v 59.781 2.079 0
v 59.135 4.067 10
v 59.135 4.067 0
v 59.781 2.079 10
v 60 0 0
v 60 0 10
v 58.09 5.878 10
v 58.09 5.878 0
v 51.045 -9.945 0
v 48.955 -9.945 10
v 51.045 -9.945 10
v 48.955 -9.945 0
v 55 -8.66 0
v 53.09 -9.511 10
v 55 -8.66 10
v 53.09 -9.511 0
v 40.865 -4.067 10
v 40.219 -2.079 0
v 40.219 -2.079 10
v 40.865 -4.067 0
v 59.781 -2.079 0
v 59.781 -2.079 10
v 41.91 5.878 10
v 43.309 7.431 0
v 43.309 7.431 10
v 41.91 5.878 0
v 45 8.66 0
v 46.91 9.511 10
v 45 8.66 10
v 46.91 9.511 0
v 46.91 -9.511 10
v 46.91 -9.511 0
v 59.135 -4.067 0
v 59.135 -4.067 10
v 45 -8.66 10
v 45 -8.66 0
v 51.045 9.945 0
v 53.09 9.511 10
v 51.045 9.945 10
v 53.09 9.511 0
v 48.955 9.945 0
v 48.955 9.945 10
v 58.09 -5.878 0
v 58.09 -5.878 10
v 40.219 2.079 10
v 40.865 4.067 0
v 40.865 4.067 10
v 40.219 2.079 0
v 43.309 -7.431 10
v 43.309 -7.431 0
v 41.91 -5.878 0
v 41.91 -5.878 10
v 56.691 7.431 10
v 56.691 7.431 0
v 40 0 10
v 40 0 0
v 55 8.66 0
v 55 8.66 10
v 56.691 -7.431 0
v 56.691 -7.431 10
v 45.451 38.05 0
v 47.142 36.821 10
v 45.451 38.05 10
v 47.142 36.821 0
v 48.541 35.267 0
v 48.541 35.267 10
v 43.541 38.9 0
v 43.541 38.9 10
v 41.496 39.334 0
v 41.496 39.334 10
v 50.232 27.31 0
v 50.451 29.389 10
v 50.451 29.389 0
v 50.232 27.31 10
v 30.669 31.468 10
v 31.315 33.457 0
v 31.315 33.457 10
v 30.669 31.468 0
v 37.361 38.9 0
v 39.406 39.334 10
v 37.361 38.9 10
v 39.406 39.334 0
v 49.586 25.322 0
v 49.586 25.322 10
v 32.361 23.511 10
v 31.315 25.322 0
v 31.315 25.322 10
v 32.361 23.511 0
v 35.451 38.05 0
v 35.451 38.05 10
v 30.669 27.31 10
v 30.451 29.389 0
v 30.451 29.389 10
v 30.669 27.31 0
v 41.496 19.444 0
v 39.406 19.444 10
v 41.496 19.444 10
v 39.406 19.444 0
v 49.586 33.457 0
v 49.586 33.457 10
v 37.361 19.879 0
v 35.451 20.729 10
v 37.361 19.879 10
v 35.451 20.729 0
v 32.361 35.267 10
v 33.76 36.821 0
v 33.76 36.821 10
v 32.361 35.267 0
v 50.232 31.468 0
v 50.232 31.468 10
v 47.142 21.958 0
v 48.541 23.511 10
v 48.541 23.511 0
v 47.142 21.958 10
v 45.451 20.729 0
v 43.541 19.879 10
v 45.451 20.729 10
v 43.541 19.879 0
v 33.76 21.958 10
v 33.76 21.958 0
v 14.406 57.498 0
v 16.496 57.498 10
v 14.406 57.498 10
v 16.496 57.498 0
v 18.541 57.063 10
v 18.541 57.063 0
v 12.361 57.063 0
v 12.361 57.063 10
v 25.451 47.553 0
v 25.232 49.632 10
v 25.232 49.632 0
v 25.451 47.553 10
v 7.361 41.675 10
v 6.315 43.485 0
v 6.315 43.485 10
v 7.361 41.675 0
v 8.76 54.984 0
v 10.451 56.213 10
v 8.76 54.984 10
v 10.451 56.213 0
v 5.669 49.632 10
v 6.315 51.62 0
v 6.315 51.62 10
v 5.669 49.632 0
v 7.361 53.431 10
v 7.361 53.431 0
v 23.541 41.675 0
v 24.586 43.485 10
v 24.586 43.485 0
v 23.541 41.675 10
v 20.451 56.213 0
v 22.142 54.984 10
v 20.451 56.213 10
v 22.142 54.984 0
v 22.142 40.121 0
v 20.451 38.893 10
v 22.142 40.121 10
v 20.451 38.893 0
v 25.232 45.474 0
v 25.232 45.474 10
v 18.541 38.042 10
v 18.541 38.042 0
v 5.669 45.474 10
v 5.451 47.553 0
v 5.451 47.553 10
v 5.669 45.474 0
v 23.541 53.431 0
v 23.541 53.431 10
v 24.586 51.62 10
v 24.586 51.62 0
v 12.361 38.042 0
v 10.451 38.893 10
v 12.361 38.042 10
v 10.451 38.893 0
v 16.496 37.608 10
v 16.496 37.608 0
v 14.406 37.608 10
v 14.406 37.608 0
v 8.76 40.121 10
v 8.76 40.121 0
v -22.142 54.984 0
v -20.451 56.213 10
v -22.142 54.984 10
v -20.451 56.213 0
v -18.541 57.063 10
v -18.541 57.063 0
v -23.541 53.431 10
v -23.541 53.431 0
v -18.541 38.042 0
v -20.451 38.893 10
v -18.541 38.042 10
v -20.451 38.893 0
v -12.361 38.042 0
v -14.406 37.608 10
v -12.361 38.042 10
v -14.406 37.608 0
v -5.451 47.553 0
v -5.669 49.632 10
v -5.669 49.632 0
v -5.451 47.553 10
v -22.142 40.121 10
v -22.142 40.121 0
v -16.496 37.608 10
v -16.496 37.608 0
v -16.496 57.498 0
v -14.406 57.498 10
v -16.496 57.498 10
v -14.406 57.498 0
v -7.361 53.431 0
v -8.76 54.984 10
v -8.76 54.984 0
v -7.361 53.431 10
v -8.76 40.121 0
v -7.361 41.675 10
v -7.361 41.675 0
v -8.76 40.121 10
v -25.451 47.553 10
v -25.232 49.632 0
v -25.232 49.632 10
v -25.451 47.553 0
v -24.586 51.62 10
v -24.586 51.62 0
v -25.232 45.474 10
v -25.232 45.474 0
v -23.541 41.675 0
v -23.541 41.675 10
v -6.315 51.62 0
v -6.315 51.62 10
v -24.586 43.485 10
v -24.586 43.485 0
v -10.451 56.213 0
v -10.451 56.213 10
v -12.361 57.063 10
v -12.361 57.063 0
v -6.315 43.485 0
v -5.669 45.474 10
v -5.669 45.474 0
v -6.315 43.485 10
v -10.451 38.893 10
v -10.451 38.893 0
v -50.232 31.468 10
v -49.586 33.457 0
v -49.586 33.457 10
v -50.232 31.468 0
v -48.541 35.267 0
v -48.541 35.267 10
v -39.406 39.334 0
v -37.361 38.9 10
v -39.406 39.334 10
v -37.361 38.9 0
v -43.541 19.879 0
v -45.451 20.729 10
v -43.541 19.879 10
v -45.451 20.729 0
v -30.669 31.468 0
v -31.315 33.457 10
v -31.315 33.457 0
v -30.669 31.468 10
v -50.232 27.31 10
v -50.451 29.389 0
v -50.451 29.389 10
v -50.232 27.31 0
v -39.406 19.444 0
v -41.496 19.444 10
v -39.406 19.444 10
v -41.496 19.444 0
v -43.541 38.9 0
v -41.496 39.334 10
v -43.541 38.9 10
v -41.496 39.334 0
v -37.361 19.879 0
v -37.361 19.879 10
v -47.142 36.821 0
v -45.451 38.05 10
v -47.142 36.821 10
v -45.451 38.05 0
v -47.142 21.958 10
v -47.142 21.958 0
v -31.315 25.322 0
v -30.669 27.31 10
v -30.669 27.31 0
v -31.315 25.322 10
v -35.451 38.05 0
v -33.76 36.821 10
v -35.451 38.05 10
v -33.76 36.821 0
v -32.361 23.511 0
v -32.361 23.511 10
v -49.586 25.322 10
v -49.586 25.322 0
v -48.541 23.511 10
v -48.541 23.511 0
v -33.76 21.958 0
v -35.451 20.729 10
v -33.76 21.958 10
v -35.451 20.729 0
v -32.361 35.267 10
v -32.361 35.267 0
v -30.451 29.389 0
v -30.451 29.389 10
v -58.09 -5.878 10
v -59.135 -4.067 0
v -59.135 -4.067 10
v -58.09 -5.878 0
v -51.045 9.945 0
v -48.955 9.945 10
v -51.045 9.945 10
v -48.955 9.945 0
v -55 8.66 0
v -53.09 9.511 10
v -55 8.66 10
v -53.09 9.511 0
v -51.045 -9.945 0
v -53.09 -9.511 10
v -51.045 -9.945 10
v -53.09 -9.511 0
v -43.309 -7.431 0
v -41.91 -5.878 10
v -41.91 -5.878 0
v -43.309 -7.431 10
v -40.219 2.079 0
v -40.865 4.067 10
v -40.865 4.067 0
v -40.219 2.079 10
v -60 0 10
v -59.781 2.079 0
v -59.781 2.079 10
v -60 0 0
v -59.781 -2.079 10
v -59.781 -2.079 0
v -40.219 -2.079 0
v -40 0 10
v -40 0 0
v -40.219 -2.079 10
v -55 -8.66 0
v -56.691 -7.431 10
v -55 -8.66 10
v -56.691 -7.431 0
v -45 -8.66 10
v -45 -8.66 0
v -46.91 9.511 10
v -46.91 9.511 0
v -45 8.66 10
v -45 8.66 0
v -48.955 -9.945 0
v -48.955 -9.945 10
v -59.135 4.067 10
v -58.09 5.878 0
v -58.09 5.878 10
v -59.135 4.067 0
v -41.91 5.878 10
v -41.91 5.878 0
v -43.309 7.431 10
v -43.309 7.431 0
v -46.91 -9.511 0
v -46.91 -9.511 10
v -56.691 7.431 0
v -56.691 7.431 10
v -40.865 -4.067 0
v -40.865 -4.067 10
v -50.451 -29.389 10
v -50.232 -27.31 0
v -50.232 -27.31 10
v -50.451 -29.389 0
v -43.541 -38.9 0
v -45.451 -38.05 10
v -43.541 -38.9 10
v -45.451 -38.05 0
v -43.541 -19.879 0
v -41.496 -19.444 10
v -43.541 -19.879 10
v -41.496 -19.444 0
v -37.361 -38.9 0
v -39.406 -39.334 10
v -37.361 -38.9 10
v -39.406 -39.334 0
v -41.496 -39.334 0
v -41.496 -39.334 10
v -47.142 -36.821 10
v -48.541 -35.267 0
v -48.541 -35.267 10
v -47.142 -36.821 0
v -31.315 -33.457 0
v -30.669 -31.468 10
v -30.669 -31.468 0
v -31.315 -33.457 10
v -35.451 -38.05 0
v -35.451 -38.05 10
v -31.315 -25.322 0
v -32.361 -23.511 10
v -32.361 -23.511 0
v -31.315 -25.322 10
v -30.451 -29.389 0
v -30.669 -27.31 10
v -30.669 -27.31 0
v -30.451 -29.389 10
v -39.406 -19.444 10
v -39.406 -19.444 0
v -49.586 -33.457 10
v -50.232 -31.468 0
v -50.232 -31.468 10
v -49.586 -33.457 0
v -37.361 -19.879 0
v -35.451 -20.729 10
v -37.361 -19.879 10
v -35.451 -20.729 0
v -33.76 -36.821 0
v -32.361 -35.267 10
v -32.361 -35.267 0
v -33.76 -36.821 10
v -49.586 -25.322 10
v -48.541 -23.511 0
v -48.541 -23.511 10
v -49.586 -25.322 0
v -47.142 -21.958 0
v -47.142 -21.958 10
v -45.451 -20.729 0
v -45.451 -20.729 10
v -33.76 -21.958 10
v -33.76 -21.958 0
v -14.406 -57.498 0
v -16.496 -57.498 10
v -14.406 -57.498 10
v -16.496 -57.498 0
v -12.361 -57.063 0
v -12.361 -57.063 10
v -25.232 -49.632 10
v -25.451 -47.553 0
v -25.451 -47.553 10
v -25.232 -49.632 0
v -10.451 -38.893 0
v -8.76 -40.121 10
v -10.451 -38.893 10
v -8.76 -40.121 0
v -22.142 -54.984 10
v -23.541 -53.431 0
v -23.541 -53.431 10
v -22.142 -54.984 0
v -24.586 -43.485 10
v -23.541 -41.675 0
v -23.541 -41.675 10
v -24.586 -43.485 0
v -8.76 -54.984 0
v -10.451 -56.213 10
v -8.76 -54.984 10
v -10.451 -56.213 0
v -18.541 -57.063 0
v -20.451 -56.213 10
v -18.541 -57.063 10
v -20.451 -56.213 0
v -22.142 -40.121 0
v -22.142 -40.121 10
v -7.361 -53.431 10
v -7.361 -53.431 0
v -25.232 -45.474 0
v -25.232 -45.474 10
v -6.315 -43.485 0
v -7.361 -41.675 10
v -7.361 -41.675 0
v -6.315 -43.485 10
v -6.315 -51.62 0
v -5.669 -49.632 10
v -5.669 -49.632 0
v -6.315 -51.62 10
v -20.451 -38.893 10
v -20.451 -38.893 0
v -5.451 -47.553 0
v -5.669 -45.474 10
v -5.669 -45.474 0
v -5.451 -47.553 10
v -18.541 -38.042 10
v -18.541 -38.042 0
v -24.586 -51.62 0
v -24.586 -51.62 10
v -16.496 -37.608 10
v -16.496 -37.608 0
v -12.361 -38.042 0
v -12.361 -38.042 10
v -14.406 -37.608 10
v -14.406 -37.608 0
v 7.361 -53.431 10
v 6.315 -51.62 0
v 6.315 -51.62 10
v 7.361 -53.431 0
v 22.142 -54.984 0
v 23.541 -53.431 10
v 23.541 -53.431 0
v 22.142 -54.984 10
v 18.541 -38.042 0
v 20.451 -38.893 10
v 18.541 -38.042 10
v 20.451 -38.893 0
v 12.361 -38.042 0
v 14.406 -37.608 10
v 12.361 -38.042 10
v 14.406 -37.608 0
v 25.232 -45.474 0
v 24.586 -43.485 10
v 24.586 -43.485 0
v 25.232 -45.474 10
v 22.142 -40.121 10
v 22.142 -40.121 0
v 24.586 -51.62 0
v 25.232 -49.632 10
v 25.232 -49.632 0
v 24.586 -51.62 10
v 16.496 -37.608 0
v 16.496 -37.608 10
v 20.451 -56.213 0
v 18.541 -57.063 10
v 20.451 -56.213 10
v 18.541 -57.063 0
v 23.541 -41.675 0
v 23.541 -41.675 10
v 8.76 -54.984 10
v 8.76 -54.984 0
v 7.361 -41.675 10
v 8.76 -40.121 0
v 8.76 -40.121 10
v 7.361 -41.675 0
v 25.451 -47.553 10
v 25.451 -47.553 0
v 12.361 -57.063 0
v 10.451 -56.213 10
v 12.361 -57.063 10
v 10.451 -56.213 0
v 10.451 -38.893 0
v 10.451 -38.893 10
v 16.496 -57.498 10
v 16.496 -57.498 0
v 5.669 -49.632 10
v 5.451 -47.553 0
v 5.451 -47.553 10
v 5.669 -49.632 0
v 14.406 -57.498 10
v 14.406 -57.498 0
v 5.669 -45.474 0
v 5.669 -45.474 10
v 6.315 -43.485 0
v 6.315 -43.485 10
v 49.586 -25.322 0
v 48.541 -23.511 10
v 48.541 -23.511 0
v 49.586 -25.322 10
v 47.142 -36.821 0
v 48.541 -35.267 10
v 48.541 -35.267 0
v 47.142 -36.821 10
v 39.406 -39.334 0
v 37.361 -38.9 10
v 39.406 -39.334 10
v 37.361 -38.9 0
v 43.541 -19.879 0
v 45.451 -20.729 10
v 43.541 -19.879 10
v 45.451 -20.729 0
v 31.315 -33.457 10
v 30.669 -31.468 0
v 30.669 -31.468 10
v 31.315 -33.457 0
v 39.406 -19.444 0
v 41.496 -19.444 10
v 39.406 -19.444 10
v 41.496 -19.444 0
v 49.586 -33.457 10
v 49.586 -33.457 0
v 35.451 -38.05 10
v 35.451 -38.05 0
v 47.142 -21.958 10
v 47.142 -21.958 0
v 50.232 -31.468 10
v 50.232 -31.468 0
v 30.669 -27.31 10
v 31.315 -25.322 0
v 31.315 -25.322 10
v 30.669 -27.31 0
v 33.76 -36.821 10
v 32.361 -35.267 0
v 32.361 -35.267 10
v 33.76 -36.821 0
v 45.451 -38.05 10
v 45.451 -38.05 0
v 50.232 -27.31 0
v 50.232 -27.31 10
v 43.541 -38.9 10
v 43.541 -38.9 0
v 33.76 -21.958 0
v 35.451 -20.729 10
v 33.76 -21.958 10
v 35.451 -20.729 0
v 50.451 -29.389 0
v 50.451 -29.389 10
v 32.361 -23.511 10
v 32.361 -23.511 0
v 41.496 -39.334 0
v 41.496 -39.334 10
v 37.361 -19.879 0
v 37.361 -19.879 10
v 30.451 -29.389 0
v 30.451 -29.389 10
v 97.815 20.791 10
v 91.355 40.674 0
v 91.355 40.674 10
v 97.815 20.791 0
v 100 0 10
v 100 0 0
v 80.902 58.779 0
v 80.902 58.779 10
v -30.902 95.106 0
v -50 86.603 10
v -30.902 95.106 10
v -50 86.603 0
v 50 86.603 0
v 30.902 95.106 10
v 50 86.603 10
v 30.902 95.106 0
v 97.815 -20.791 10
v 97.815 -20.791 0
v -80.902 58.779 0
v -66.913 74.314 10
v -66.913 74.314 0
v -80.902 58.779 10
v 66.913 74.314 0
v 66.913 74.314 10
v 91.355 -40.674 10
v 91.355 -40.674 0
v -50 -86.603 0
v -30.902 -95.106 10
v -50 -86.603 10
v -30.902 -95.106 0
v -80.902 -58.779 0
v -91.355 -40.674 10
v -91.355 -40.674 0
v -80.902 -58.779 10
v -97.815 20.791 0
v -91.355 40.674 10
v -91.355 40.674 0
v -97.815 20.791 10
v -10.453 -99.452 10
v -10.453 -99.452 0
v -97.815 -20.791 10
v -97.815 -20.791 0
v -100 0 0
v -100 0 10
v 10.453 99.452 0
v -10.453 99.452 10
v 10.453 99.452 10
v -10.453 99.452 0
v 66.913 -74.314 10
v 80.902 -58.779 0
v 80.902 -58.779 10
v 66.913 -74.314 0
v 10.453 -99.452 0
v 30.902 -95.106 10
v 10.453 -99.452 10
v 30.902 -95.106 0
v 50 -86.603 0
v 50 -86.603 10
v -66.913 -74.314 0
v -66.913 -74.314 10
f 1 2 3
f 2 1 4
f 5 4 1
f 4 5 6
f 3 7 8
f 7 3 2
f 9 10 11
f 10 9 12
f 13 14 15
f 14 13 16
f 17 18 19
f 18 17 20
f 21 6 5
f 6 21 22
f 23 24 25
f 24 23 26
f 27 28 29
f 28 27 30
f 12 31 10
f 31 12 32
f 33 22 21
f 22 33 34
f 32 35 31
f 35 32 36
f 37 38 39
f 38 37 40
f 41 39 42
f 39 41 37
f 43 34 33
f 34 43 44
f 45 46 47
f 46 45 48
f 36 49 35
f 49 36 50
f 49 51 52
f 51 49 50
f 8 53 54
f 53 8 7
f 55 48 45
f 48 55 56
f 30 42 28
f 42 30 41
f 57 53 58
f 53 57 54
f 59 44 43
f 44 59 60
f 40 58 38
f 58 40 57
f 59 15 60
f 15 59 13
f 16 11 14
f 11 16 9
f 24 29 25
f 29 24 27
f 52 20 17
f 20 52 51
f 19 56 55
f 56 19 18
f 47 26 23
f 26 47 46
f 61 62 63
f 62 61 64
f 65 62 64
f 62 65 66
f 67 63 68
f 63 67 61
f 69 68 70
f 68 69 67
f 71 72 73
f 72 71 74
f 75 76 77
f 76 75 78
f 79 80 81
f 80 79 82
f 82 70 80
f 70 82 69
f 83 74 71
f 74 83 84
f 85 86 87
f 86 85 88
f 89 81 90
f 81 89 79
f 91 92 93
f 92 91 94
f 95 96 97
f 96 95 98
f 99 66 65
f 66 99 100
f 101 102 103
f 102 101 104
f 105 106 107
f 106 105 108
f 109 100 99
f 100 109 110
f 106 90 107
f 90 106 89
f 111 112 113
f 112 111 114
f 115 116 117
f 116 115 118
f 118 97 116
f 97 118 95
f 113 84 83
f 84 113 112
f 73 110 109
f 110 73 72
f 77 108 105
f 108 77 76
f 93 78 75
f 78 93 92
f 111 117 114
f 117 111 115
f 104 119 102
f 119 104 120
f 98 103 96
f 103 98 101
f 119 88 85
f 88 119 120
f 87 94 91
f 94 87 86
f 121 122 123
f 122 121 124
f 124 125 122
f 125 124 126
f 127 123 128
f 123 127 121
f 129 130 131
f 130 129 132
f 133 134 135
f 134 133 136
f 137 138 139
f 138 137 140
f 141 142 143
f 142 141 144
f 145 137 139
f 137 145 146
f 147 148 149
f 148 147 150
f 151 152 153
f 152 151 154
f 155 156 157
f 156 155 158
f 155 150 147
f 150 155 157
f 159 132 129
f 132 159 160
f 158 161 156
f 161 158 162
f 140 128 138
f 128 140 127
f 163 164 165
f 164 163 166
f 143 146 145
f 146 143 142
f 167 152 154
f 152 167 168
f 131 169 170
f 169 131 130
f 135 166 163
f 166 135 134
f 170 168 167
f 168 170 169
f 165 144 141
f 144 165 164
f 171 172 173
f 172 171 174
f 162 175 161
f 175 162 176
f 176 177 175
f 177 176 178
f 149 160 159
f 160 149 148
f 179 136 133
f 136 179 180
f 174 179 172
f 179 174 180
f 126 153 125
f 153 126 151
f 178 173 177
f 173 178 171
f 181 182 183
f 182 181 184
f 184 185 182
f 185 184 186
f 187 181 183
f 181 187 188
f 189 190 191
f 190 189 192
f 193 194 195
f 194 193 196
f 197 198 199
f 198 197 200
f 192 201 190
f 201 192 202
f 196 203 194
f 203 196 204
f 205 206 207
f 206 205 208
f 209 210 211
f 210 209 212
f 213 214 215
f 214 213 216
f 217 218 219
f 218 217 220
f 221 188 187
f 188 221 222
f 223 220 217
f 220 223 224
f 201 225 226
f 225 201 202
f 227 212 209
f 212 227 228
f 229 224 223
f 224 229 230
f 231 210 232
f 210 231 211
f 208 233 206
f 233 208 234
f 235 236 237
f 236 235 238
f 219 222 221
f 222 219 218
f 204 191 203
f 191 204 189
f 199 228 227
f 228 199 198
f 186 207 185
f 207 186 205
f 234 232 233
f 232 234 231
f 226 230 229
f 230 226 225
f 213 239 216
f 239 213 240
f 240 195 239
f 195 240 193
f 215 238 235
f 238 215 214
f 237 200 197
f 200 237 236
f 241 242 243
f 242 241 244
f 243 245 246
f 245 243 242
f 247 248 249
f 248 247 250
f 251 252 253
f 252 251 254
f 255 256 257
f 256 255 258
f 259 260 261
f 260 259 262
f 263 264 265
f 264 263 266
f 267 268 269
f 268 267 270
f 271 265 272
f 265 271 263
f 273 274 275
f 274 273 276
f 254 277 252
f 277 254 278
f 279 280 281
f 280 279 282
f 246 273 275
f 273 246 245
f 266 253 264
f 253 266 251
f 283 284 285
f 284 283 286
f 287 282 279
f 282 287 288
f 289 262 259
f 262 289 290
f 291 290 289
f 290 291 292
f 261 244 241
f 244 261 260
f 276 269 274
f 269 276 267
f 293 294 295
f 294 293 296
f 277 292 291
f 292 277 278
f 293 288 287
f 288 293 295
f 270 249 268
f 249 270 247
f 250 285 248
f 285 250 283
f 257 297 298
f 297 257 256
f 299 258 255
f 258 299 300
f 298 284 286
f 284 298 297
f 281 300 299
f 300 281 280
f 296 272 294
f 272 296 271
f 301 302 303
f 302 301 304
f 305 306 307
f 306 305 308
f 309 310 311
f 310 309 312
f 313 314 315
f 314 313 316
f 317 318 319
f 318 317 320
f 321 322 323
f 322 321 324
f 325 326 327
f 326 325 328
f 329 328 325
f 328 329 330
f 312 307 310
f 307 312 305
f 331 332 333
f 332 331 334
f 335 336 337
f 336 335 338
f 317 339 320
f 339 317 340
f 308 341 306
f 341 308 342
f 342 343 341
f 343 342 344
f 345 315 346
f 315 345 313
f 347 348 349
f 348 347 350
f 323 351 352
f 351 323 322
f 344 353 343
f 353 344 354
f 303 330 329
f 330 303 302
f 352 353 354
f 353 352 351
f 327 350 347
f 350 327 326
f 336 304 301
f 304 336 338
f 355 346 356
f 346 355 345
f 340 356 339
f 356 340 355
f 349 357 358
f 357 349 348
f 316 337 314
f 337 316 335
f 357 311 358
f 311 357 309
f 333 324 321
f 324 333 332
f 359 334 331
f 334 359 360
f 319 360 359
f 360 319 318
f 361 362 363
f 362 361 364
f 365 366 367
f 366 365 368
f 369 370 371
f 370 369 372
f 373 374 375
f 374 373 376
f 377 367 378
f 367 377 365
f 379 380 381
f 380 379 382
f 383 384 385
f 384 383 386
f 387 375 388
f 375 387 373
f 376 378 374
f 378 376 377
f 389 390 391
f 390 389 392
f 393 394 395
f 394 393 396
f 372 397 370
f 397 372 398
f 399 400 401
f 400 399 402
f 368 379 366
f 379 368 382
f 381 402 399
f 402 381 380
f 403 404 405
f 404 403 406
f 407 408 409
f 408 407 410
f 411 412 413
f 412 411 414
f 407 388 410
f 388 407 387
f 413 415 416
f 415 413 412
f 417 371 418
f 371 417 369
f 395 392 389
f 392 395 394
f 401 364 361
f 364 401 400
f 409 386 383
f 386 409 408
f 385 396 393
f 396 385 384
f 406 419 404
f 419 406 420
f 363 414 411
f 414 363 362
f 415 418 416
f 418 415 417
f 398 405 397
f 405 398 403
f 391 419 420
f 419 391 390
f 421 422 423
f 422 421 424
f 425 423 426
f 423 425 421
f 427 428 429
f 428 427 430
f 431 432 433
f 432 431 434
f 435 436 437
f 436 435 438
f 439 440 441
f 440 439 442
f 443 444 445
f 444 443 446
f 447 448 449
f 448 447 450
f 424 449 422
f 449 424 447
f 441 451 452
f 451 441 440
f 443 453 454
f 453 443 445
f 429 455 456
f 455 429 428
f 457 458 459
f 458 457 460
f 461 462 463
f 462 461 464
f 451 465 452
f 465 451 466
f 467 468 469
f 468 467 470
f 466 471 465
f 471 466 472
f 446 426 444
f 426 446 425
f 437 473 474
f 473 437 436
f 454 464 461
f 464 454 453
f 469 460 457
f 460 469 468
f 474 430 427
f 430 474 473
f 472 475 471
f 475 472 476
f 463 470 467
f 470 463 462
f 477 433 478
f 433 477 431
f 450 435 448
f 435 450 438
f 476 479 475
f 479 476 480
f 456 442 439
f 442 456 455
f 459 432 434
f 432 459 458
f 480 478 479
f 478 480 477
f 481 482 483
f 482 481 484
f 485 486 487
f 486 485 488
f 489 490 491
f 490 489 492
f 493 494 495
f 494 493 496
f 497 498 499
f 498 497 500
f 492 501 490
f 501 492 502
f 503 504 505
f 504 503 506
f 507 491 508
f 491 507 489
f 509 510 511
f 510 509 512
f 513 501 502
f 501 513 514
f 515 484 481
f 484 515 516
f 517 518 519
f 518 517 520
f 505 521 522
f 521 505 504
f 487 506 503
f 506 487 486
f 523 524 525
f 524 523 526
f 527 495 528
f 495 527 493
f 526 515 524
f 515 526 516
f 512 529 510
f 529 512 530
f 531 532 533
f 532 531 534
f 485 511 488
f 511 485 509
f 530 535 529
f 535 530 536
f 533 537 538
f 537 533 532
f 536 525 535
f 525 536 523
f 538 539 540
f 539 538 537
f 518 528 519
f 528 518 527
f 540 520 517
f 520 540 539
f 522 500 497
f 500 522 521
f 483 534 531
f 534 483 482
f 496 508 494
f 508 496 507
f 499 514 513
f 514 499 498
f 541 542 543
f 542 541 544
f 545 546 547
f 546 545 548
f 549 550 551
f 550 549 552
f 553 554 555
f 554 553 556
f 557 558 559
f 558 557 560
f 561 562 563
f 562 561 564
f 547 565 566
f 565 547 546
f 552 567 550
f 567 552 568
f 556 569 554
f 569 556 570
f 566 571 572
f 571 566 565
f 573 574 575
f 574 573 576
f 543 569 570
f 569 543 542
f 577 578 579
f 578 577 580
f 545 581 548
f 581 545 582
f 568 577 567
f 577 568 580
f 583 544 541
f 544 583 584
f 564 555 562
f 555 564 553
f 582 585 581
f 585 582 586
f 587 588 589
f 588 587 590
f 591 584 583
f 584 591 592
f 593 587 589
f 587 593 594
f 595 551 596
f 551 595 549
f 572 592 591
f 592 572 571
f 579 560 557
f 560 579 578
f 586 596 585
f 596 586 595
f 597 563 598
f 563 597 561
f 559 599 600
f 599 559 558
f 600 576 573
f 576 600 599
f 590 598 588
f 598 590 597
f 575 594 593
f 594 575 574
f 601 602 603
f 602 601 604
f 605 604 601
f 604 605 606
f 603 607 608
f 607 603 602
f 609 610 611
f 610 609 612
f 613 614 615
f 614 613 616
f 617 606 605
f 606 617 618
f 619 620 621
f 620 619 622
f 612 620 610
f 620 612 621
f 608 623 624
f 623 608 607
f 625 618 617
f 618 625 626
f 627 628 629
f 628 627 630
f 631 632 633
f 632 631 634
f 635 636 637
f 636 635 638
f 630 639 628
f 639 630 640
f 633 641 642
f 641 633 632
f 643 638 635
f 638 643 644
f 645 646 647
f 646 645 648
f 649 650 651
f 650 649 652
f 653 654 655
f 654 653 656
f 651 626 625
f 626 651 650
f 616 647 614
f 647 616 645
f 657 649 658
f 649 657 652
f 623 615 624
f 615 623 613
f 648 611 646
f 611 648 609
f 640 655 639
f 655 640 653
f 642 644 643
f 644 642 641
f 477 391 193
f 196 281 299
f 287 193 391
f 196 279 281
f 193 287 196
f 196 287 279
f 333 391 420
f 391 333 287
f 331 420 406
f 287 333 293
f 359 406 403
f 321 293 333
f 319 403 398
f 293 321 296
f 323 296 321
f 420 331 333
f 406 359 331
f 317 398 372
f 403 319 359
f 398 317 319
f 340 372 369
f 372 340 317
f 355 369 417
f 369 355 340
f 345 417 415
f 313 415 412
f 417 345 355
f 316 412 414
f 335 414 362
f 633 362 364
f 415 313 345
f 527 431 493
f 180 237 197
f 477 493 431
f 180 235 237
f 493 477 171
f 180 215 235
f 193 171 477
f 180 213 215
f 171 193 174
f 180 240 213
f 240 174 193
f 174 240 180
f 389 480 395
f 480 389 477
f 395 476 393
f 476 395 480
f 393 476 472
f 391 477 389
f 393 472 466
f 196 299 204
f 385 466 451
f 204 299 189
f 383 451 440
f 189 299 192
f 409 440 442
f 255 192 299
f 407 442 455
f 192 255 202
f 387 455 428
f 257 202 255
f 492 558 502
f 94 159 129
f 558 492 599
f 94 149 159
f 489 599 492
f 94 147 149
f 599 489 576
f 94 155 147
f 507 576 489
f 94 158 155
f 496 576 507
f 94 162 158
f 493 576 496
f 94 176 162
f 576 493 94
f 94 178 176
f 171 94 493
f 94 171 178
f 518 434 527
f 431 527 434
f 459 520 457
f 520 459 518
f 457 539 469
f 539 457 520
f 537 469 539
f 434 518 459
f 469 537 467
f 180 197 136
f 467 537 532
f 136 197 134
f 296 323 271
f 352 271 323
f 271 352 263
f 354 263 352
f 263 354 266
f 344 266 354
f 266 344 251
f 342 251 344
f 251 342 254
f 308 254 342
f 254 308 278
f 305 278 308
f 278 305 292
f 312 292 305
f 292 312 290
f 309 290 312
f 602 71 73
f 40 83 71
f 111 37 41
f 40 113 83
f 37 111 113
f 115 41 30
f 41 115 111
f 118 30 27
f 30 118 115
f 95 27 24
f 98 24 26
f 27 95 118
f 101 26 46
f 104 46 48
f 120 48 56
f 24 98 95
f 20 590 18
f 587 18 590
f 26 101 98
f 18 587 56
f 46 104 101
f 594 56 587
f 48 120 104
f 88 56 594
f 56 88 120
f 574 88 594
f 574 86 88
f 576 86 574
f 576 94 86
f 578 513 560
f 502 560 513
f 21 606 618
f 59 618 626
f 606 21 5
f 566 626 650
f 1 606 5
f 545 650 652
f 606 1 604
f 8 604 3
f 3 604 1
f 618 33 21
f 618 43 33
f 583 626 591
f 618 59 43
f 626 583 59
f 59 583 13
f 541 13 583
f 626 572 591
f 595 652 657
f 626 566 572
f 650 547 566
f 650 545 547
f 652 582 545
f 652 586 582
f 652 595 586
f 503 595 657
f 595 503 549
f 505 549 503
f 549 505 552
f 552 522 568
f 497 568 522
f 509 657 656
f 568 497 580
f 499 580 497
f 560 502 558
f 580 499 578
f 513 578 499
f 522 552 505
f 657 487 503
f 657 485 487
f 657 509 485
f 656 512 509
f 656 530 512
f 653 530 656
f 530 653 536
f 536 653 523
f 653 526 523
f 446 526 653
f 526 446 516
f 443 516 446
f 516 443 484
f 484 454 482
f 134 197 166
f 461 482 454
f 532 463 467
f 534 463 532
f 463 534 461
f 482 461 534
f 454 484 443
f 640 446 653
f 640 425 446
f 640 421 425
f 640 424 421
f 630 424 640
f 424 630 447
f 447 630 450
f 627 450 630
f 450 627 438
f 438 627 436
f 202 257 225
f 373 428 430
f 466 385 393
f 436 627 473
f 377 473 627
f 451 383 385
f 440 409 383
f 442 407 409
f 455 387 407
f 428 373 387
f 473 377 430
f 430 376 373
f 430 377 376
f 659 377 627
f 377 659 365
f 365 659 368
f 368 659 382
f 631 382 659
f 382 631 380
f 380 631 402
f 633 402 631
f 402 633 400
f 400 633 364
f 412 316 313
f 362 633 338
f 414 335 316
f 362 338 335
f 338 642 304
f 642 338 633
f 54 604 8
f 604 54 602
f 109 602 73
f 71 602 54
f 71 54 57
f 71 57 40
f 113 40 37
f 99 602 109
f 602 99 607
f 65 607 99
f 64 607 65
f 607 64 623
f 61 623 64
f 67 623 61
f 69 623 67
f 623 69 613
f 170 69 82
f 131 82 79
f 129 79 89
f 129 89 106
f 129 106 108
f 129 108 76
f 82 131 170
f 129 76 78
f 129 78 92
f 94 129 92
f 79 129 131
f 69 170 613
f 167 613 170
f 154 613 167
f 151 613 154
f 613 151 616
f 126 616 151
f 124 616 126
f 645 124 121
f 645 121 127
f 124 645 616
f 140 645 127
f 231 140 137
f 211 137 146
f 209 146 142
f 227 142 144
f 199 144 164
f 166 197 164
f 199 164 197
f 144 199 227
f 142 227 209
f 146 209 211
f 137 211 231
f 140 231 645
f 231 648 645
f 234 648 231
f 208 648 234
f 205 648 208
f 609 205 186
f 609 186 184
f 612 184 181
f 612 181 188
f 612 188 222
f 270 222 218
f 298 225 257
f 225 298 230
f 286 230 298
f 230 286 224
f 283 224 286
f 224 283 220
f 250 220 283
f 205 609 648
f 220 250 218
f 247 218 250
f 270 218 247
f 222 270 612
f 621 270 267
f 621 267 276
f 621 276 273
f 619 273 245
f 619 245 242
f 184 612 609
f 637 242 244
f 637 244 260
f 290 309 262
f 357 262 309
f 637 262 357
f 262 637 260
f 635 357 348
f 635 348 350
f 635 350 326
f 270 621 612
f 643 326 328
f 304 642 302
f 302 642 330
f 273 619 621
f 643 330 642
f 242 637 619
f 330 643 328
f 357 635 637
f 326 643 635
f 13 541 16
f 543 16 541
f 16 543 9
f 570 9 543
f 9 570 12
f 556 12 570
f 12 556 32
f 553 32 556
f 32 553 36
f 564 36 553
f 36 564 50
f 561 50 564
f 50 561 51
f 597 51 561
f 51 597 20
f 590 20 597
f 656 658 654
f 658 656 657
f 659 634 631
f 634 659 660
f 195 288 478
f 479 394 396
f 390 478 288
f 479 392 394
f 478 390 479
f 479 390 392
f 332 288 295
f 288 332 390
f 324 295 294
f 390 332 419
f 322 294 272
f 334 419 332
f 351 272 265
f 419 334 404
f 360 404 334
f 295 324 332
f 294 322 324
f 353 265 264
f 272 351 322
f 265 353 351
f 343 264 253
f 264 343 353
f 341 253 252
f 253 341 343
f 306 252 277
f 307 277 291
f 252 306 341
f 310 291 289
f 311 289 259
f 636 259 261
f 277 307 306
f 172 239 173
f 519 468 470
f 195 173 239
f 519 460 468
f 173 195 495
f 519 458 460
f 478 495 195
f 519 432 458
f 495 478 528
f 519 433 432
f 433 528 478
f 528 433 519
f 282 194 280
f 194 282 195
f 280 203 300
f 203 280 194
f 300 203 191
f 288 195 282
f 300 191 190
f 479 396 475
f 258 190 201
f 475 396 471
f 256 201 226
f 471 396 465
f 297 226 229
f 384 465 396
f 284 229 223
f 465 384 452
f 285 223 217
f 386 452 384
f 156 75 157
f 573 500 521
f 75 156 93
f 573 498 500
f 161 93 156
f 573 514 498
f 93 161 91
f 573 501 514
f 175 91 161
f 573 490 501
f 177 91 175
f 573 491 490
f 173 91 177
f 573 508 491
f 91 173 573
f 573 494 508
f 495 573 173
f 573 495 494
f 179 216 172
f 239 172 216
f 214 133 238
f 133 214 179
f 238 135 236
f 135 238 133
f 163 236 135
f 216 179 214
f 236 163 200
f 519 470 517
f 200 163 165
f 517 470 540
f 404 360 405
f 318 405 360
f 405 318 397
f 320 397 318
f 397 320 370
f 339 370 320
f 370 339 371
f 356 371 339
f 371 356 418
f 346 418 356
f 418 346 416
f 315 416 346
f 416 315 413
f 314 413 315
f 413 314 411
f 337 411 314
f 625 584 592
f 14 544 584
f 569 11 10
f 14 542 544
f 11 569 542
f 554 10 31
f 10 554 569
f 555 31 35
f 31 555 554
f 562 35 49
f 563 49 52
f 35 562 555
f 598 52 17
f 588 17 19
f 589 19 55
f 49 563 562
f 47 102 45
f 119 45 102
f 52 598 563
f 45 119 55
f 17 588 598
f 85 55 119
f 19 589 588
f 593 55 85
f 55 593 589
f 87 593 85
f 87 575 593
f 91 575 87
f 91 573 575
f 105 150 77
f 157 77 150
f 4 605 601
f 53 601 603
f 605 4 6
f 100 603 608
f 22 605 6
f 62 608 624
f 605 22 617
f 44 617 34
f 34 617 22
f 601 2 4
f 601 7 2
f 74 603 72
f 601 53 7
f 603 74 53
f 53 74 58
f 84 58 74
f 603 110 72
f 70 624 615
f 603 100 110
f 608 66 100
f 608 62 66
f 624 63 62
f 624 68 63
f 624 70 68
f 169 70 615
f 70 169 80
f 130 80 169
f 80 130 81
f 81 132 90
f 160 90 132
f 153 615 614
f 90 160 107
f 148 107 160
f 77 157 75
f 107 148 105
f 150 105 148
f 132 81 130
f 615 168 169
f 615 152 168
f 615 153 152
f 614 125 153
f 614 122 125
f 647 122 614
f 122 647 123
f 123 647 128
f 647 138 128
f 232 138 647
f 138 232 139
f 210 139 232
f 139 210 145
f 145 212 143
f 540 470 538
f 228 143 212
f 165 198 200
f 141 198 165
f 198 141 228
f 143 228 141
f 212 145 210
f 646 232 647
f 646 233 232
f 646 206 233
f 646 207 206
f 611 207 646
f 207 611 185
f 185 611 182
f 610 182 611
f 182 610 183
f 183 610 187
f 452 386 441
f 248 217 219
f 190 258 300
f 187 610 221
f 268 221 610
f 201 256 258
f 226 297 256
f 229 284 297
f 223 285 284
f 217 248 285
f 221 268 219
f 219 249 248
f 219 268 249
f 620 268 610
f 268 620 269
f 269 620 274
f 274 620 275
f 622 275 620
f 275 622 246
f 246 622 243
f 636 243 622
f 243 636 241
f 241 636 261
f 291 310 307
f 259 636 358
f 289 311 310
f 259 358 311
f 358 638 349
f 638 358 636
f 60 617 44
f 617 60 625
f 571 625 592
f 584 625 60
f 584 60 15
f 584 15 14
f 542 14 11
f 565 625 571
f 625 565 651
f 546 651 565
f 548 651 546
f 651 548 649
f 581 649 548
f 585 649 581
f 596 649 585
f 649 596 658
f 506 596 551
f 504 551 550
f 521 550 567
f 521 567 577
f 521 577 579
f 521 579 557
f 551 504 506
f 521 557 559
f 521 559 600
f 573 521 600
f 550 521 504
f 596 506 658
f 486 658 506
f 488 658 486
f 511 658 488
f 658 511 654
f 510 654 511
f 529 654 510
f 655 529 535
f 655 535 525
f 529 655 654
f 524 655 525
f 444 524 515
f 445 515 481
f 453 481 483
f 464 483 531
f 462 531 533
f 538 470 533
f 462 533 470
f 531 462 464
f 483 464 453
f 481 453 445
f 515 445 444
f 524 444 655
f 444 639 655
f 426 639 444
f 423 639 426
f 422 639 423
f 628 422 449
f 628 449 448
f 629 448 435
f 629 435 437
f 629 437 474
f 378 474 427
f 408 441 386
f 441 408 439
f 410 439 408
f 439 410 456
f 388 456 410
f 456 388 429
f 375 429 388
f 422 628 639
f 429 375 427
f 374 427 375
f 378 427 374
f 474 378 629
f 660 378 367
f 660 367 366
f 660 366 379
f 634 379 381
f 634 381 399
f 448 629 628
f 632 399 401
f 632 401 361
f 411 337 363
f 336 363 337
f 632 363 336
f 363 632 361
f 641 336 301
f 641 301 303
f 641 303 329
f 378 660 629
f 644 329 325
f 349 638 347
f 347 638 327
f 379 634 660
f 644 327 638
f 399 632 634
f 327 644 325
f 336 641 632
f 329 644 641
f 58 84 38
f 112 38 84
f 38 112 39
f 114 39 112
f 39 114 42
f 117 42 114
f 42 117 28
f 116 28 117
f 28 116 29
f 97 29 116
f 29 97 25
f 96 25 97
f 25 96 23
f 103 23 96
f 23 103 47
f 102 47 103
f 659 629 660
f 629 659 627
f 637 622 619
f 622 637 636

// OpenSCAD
module roata(raza,grosime,raza_gaura,nr_gauri)
{
    difference(){
    cylinder(h=grosime,r=raza);
    for(i=[0:360/nr_gauri:359])
        rotate([0,0,i])
            translate([raza/2,0,-1])
                cylinder(h=grosime+2,r=raza_gaura);
}
    
    }

rotate([0,0,$t*90]) 
roata(raza=100,grosime=10,raza_gaura=10,nr_gauri=10);
